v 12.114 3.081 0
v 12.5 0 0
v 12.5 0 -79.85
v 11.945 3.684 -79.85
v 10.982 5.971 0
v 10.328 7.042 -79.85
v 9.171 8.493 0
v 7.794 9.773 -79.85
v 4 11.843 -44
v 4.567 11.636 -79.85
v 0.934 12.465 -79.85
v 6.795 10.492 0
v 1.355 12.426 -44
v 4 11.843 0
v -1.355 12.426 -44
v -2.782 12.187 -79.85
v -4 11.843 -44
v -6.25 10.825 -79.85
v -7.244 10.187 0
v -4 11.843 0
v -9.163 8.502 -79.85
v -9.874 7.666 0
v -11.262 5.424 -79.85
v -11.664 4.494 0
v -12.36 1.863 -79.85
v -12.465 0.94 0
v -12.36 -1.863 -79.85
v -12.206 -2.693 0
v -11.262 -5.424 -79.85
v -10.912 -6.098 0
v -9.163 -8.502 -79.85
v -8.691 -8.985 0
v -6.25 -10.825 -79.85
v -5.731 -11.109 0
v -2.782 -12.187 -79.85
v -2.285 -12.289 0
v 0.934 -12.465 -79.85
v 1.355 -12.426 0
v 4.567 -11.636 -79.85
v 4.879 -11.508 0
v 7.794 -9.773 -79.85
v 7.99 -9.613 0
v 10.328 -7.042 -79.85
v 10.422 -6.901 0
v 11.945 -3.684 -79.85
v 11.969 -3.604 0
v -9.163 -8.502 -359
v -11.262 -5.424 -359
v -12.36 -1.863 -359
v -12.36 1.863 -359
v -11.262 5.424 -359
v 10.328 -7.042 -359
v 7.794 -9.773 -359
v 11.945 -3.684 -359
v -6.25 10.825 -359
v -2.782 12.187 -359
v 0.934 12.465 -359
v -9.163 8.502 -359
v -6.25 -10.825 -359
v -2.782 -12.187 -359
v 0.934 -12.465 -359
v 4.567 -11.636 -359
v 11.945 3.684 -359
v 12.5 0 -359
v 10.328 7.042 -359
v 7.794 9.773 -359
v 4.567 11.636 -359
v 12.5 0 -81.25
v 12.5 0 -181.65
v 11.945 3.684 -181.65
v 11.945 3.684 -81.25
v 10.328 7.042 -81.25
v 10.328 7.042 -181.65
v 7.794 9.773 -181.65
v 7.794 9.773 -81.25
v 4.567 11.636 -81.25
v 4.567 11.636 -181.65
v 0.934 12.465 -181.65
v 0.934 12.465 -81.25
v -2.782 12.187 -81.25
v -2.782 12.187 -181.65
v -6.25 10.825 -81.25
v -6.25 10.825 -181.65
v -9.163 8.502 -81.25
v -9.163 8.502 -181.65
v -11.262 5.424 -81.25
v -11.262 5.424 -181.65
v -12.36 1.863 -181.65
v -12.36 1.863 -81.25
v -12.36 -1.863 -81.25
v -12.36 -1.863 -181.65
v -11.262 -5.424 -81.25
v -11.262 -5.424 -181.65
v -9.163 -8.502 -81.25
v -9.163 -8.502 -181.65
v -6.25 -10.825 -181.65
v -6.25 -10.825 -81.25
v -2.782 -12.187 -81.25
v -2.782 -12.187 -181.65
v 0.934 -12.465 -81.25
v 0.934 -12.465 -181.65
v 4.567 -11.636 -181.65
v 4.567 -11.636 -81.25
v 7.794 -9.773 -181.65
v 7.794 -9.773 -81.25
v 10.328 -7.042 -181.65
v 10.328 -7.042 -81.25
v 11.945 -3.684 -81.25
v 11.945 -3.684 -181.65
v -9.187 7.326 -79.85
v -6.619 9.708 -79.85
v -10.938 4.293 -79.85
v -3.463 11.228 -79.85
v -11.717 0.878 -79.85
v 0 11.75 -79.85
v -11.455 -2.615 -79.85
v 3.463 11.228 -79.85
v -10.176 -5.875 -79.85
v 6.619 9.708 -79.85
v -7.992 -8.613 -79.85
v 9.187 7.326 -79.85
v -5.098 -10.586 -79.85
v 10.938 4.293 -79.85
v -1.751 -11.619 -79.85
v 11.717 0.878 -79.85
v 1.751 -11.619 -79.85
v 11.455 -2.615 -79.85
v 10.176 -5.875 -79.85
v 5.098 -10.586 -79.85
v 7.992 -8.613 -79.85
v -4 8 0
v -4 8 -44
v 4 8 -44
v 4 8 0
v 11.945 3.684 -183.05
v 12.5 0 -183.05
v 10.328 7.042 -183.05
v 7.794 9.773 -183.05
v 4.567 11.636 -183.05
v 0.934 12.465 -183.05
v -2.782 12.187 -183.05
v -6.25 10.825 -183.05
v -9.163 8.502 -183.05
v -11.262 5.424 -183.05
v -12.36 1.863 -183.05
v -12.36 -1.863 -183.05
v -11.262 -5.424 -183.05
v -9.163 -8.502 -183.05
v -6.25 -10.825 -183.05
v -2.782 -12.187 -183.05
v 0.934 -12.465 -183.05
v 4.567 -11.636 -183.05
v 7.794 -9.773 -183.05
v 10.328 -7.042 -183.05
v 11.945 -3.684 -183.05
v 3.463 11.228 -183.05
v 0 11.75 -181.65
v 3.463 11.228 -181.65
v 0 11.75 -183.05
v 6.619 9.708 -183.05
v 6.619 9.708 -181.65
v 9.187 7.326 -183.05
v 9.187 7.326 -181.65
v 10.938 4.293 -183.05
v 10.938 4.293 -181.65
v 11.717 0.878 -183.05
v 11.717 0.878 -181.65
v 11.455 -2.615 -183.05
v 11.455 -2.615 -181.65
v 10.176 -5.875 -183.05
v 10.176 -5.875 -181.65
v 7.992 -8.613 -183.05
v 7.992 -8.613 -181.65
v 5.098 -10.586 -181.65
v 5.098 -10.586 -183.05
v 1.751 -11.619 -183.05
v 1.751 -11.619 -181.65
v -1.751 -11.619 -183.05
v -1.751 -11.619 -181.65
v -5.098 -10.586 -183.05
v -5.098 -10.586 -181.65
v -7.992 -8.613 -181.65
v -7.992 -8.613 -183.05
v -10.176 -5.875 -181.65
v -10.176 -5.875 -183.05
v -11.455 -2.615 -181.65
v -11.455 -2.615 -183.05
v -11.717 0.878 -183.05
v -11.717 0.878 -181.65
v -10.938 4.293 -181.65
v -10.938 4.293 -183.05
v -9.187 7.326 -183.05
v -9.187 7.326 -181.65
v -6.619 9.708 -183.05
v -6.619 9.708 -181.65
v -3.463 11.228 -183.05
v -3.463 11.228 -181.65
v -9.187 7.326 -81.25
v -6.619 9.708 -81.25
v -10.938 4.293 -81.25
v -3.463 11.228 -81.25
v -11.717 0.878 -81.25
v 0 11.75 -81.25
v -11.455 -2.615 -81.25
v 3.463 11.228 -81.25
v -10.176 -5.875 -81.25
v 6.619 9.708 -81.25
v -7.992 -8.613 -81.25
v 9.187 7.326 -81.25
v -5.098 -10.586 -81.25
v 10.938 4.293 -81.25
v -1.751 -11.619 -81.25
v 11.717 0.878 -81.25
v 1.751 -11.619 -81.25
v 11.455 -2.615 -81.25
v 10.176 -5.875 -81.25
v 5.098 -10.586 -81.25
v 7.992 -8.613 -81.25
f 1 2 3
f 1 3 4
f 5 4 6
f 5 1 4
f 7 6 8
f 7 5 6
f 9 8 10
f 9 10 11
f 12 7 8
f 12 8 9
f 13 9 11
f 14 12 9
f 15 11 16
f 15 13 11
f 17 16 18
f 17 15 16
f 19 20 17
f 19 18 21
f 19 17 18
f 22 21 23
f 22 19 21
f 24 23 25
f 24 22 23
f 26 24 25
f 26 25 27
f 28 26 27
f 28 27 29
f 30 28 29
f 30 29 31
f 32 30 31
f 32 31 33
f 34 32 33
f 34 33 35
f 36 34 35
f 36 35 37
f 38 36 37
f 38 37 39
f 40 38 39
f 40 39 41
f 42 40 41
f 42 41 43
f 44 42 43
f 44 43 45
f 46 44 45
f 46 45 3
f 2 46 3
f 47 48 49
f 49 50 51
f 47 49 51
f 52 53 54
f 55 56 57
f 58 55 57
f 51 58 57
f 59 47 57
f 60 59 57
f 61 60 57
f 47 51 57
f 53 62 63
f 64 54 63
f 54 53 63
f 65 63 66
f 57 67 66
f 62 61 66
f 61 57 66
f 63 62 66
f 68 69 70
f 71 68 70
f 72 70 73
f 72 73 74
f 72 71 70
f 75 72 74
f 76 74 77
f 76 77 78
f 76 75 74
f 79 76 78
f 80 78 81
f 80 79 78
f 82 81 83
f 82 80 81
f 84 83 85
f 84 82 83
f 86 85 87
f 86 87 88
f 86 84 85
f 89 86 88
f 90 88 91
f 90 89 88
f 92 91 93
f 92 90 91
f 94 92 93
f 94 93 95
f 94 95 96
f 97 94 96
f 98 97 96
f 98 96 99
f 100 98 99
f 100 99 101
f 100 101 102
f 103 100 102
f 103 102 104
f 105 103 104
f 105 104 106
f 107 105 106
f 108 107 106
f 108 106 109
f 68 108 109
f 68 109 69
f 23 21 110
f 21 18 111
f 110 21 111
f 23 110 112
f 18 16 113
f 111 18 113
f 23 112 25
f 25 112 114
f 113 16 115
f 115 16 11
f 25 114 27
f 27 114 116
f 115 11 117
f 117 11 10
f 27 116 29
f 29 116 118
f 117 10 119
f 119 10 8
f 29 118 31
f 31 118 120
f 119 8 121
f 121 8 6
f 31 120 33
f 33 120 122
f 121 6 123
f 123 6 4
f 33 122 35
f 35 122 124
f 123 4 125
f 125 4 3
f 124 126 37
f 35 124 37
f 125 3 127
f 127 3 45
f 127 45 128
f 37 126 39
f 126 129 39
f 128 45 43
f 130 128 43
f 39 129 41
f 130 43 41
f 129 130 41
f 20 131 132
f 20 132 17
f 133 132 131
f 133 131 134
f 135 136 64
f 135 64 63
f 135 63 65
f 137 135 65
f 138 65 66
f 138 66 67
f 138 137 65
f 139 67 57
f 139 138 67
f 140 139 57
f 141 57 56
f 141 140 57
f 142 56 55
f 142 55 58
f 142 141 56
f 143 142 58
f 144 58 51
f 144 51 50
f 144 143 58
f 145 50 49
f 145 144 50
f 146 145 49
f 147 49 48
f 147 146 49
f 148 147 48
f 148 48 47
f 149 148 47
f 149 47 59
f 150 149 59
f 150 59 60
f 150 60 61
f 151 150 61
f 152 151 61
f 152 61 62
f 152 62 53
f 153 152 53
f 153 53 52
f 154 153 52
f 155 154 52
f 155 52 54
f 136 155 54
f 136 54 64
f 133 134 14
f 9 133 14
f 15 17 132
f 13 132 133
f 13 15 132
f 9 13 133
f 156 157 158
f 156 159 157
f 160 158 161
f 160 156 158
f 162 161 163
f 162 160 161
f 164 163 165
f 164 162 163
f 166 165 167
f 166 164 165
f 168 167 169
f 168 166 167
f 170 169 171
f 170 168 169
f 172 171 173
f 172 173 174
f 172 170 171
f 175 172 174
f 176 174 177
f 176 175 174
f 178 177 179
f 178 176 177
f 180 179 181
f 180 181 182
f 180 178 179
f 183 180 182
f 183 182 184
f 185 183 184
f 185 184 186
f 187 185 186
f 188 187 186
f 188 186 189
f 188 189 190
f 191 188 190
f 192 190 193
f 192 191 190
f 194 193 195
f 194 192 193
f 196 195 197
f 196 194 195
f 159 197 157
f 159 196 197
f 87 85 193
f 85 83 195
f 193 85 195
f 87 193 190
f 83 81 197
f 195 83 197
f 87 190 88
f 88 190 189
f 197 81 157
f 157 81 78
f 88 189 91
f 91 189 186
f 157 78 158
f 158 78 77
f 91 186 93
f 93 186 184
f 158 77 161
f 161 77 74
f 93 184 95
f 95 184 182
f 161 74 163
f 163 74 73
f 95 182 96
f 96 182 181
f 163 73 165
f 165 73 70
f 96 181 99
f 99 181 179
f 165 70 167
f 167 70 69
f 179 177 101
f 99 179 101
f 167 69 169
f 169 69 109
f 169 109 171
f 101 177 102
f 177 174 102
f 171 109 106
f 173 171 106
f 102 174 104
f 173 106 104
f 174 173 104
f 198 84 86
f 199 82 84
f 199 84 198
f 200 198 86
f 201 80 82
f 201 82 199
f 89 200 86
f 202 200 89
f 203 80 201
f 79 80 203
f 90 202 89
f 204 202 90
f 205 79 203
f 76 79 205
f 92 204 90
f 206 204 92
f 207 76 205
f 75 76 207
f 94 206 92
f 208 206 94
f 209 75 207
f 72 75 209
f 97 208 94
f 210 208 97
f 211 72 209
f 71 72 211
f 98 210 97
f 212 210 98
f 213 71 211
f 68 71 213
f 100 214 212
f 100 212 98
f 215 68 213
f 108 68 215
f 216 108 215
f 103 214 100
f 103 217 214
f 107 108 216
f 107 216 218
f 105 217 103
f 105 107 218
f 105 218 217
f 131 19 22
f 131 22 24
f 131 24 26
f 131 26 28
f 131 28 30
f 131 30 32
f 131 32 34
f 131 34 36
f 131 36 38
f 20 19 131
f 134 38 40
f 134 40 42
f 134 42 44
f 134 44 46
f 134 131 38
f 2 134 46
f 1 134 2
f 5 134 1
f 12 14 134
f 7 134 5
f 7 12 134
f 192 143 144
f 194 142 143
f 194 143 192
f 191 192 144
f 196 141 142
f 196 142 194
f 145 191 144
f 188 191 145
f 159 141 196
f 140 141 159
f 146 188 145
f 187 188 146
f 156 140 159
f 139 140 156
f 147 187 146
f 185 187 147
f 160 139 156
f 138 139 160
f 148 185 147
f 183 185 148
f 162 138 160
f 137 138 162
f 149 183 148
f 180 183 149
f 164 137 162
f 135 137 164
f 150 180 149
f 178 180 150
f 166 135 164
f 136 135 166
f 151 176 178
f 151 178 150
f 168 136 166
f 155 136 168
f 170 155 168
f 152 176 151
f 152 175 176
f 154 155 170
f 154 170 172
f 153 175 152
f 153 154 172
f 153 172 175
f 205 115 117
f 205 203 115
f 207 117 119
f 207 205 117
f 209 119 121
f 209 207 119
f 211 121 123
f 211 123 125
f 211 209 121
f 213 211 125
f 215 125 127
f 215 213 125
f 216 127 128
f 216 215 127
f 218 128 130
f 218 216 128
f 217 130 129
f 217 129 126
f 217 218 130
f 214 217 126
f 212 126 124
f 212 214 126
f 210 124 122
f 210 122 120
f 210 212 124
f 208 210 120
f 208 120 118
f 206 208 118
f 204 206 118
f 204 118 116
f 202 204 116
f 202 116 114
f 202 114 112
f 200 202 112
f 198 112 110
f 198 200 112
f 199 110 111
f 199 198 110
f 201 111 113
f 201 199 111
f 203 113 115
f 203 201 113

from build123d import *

# Parameters (mm, degrees)
SKETCH_1_R          = 12.5
EXTRUDE_1_DEPTH     = 359
CUT_EXTRUDE_START   = -44
SKETCH_2_W          = 8
SKETCH_2_H          = 8.5
CUT_EXTRUDE_1_DEPTH = 44
SKETCH_3_W          = 1.4
SKETCH_3_H          = 2.395884976
SKETCH_3_H_2        = 2.262849939


with BuildPart() as part:
    # Эскиз1 → Бобышка-Вытянуть1 (new body)
    with BuildSketch(Plane.XY):
        Circle(SKETCH_1_R)
    extrude(amount=-EXTRUDE_1_DEPTH)

    # Эскиз2 → Вырез-Вытянуть1 (cut)
    with BuildSketch(Plane.XY.offset(CUT_EXTRUDE_START)):
        with Locations((0, 12.25)):
            Rectangle(SKETCH_2_W, SKETCH_2_H)
    extrude(amount=CUT_EXTRUDE_1_DEPTH, mode=Mode.SUBTRACT)

    # Эскиз3 → Вырез-Повернуть1 (revolve, cut)
    with BuildSketch(Plane(origin=(0, 0, 0), x_dir=(0, 0, -1), z_dir=(1, 0, 0))):
        with Locations((182.35, 12.947942488)):
            Rectangle(SKETCH_3_W, SKETCH_3_H)
        with Locations((80.55, 12.881424969)):
            Rectangle(SKETCH_3_W, SKETCH_3_H_2)
    revolve(axis=Axis((0, 0, 1000), (0, 0, -1)), mode=Mode.SUBTRACT)


solid = part.part
